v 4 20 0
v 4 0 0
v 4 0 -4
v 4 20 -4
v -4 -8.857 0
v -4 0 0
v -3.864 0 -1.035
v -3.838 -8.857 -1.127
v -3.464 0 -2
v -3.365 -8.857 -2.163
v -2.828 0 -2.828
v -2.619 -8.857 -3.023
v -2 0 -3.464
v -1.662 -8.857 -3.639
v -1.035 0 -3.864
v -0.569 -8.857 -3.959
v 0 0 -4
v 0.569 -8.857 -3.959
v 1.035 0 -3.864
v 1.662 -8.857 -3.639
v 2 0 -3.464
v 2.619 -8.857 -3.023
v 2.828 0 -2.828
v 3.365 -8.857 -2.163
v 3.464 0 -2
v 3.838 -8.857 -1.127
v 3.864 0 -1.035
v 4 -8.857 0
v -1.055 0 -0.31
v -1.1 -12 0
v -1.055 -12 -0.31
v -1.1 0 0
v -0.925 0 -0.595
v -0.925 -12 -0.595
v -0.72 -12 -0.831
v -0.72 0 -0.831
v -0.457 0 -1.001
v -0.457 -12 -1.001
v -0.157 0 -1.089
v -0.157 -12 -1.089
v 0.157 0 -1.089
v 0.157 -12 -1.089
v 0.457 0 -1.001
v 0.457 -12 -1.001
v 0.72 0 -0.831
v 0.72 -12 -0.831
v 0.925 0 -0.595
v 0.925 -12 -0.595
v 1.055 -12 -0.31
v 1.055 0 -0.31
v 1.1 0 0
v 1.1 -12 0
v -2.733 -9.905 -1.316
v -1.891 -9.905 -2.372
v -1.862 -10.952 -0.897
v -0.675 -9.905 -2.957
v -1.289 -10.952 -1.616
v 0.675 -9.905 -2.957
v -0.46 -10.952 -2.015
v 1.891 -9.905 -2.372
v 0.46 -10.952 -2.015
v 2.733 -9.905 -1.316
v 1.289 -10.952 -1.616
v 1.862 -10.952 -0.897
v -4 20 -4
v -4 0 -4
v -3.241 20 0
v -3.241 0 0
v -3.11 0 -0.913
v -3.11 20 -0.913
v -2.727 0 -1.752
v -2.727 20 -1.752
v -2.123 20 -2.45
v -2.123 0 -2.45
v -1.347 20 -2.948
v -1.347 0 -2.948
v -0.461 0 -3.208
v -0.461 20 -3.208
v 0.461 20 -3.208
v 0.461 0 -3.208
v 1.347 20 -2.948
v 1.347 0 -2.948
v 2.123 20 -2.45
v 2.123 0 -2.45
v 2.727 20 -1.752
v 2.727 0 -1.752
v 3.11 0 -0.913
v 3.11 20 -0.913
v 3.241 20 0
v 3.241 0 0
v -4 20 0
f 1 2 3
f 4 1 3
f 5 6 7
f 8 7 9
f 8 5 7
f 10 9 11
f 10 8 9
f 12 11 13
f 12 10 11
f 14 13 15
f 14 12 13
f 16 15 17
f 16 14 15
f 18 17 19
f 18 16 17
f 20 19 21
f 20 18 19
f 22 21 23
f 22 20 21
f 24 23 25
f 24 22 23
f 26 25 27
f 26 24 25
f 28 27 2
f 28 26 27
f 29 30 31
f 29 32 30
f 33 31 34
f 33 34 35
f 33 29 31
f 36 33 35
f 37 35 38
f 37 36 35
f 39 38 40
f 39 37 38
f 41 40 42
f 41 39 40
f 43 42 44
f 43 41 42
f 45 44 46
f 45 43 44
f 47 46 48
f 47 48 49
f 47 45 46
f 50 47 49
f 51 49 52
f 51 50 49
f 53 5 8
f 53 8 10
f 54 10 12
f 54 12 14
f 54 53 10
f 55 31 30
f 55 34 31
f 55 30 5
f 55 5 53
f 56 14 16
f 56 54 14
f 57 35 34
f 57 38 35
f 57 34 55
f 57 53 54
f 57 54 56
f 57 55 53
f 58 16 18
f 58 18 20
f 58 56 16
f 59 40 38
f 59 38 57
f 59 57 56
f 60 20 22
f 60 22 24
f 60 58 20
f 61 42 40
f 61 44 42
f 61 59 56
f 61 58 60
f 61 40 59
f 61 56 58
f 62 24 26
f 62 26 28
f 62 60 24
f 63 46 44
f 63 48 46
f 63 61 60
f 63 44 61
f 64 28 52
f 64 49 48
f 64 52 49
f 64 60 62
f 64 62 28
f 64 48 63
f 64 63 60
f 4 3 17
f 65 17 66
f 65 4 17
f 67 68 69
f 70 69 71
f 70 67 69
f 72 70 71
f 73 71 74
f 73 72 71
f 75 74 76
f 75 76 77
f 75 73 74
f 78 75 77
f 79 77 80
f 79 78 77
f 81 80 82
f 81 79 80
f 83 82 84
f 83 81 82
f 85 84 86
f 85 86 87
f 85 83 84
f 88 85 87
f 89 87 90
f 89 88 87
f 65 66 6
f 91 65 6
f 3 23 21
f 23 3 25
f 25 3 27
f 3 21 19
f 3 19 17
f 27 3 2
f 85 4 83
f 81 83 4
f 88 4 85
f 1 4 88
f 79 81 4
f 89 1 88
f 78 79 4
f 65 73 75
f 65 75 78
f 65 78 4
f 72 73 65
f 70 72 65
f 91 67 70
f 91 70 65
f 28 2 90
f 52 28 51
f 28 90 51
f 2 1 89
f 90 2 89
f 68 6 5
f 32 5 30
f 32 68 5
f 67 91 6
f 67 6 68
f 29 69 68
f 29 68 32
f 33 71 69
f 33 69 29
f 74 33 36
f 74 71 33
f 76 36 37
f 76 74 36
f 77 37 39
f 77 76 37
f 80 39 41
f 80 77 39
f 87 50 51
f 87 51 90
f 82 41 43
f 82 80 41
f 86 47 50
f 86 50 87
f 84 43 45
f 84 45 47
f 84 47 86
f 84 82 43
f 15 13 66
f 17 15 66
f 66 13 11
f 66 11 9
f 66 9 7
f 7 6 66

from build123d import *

# Parameters (mm, degrees)
F0_W     = 0.7586409766
F0_H     = 4.9999998882
F0_H_2   = 9
F0_H_3   = 6.0000001118
F1_ANGLE = 180
F3_DEPTH = 20


with BuildPart() as f1:
    # F0 (on Top) → F1 (revolve)
    with BuildSketch(Plane.XY):
        Polygon((-4, -8.8572846726), (-1.1, -12), (-1.1, 0), (-1.55, 0), (-3.2413590234, 0), (-4, 0), align=None)
        with Locations((-3.6206795117, 2.4999999441)):
            Rectangle(F0_W, F0_H)
        with Locations((-3.6206795117, 9.4999998882)):
            Rectangle(F0_W, F0_H_2)
        with Locations((-3.6206795117, 16.9999999441)):
            Rectangle(F0_W, F0_H_3)
    revolve(axis=Axis((0, 4.4247480631, 0), (0, -1, 0)), revolution_arc=F1_ANGLE)

    # F2 (on face) → F3 (join)
    with BuildSketch(Plane(origin=(0, 20, 0), x_dir=(-1, 0, 0), z_dir=(0, 1, 0))):
        with BuildLine():
            ThreePointArc((0, -4), (-2.8284271247, -2.8284271247), (-4, 0))
            Line((-4, 0), (-4, -4))
            Line((-4, -4), (0, -4))
        make_face()
        with BuildLine():
            ThreePointArc((4, 0), (2.8284271247, -2.8284271247), (0, -4))
            Line((0, -4), (4, -4))
            Line((4, -4), (4, 0))
        make_face()
    extrude(amount=-F3_DEPTH)


solid = f1.part
